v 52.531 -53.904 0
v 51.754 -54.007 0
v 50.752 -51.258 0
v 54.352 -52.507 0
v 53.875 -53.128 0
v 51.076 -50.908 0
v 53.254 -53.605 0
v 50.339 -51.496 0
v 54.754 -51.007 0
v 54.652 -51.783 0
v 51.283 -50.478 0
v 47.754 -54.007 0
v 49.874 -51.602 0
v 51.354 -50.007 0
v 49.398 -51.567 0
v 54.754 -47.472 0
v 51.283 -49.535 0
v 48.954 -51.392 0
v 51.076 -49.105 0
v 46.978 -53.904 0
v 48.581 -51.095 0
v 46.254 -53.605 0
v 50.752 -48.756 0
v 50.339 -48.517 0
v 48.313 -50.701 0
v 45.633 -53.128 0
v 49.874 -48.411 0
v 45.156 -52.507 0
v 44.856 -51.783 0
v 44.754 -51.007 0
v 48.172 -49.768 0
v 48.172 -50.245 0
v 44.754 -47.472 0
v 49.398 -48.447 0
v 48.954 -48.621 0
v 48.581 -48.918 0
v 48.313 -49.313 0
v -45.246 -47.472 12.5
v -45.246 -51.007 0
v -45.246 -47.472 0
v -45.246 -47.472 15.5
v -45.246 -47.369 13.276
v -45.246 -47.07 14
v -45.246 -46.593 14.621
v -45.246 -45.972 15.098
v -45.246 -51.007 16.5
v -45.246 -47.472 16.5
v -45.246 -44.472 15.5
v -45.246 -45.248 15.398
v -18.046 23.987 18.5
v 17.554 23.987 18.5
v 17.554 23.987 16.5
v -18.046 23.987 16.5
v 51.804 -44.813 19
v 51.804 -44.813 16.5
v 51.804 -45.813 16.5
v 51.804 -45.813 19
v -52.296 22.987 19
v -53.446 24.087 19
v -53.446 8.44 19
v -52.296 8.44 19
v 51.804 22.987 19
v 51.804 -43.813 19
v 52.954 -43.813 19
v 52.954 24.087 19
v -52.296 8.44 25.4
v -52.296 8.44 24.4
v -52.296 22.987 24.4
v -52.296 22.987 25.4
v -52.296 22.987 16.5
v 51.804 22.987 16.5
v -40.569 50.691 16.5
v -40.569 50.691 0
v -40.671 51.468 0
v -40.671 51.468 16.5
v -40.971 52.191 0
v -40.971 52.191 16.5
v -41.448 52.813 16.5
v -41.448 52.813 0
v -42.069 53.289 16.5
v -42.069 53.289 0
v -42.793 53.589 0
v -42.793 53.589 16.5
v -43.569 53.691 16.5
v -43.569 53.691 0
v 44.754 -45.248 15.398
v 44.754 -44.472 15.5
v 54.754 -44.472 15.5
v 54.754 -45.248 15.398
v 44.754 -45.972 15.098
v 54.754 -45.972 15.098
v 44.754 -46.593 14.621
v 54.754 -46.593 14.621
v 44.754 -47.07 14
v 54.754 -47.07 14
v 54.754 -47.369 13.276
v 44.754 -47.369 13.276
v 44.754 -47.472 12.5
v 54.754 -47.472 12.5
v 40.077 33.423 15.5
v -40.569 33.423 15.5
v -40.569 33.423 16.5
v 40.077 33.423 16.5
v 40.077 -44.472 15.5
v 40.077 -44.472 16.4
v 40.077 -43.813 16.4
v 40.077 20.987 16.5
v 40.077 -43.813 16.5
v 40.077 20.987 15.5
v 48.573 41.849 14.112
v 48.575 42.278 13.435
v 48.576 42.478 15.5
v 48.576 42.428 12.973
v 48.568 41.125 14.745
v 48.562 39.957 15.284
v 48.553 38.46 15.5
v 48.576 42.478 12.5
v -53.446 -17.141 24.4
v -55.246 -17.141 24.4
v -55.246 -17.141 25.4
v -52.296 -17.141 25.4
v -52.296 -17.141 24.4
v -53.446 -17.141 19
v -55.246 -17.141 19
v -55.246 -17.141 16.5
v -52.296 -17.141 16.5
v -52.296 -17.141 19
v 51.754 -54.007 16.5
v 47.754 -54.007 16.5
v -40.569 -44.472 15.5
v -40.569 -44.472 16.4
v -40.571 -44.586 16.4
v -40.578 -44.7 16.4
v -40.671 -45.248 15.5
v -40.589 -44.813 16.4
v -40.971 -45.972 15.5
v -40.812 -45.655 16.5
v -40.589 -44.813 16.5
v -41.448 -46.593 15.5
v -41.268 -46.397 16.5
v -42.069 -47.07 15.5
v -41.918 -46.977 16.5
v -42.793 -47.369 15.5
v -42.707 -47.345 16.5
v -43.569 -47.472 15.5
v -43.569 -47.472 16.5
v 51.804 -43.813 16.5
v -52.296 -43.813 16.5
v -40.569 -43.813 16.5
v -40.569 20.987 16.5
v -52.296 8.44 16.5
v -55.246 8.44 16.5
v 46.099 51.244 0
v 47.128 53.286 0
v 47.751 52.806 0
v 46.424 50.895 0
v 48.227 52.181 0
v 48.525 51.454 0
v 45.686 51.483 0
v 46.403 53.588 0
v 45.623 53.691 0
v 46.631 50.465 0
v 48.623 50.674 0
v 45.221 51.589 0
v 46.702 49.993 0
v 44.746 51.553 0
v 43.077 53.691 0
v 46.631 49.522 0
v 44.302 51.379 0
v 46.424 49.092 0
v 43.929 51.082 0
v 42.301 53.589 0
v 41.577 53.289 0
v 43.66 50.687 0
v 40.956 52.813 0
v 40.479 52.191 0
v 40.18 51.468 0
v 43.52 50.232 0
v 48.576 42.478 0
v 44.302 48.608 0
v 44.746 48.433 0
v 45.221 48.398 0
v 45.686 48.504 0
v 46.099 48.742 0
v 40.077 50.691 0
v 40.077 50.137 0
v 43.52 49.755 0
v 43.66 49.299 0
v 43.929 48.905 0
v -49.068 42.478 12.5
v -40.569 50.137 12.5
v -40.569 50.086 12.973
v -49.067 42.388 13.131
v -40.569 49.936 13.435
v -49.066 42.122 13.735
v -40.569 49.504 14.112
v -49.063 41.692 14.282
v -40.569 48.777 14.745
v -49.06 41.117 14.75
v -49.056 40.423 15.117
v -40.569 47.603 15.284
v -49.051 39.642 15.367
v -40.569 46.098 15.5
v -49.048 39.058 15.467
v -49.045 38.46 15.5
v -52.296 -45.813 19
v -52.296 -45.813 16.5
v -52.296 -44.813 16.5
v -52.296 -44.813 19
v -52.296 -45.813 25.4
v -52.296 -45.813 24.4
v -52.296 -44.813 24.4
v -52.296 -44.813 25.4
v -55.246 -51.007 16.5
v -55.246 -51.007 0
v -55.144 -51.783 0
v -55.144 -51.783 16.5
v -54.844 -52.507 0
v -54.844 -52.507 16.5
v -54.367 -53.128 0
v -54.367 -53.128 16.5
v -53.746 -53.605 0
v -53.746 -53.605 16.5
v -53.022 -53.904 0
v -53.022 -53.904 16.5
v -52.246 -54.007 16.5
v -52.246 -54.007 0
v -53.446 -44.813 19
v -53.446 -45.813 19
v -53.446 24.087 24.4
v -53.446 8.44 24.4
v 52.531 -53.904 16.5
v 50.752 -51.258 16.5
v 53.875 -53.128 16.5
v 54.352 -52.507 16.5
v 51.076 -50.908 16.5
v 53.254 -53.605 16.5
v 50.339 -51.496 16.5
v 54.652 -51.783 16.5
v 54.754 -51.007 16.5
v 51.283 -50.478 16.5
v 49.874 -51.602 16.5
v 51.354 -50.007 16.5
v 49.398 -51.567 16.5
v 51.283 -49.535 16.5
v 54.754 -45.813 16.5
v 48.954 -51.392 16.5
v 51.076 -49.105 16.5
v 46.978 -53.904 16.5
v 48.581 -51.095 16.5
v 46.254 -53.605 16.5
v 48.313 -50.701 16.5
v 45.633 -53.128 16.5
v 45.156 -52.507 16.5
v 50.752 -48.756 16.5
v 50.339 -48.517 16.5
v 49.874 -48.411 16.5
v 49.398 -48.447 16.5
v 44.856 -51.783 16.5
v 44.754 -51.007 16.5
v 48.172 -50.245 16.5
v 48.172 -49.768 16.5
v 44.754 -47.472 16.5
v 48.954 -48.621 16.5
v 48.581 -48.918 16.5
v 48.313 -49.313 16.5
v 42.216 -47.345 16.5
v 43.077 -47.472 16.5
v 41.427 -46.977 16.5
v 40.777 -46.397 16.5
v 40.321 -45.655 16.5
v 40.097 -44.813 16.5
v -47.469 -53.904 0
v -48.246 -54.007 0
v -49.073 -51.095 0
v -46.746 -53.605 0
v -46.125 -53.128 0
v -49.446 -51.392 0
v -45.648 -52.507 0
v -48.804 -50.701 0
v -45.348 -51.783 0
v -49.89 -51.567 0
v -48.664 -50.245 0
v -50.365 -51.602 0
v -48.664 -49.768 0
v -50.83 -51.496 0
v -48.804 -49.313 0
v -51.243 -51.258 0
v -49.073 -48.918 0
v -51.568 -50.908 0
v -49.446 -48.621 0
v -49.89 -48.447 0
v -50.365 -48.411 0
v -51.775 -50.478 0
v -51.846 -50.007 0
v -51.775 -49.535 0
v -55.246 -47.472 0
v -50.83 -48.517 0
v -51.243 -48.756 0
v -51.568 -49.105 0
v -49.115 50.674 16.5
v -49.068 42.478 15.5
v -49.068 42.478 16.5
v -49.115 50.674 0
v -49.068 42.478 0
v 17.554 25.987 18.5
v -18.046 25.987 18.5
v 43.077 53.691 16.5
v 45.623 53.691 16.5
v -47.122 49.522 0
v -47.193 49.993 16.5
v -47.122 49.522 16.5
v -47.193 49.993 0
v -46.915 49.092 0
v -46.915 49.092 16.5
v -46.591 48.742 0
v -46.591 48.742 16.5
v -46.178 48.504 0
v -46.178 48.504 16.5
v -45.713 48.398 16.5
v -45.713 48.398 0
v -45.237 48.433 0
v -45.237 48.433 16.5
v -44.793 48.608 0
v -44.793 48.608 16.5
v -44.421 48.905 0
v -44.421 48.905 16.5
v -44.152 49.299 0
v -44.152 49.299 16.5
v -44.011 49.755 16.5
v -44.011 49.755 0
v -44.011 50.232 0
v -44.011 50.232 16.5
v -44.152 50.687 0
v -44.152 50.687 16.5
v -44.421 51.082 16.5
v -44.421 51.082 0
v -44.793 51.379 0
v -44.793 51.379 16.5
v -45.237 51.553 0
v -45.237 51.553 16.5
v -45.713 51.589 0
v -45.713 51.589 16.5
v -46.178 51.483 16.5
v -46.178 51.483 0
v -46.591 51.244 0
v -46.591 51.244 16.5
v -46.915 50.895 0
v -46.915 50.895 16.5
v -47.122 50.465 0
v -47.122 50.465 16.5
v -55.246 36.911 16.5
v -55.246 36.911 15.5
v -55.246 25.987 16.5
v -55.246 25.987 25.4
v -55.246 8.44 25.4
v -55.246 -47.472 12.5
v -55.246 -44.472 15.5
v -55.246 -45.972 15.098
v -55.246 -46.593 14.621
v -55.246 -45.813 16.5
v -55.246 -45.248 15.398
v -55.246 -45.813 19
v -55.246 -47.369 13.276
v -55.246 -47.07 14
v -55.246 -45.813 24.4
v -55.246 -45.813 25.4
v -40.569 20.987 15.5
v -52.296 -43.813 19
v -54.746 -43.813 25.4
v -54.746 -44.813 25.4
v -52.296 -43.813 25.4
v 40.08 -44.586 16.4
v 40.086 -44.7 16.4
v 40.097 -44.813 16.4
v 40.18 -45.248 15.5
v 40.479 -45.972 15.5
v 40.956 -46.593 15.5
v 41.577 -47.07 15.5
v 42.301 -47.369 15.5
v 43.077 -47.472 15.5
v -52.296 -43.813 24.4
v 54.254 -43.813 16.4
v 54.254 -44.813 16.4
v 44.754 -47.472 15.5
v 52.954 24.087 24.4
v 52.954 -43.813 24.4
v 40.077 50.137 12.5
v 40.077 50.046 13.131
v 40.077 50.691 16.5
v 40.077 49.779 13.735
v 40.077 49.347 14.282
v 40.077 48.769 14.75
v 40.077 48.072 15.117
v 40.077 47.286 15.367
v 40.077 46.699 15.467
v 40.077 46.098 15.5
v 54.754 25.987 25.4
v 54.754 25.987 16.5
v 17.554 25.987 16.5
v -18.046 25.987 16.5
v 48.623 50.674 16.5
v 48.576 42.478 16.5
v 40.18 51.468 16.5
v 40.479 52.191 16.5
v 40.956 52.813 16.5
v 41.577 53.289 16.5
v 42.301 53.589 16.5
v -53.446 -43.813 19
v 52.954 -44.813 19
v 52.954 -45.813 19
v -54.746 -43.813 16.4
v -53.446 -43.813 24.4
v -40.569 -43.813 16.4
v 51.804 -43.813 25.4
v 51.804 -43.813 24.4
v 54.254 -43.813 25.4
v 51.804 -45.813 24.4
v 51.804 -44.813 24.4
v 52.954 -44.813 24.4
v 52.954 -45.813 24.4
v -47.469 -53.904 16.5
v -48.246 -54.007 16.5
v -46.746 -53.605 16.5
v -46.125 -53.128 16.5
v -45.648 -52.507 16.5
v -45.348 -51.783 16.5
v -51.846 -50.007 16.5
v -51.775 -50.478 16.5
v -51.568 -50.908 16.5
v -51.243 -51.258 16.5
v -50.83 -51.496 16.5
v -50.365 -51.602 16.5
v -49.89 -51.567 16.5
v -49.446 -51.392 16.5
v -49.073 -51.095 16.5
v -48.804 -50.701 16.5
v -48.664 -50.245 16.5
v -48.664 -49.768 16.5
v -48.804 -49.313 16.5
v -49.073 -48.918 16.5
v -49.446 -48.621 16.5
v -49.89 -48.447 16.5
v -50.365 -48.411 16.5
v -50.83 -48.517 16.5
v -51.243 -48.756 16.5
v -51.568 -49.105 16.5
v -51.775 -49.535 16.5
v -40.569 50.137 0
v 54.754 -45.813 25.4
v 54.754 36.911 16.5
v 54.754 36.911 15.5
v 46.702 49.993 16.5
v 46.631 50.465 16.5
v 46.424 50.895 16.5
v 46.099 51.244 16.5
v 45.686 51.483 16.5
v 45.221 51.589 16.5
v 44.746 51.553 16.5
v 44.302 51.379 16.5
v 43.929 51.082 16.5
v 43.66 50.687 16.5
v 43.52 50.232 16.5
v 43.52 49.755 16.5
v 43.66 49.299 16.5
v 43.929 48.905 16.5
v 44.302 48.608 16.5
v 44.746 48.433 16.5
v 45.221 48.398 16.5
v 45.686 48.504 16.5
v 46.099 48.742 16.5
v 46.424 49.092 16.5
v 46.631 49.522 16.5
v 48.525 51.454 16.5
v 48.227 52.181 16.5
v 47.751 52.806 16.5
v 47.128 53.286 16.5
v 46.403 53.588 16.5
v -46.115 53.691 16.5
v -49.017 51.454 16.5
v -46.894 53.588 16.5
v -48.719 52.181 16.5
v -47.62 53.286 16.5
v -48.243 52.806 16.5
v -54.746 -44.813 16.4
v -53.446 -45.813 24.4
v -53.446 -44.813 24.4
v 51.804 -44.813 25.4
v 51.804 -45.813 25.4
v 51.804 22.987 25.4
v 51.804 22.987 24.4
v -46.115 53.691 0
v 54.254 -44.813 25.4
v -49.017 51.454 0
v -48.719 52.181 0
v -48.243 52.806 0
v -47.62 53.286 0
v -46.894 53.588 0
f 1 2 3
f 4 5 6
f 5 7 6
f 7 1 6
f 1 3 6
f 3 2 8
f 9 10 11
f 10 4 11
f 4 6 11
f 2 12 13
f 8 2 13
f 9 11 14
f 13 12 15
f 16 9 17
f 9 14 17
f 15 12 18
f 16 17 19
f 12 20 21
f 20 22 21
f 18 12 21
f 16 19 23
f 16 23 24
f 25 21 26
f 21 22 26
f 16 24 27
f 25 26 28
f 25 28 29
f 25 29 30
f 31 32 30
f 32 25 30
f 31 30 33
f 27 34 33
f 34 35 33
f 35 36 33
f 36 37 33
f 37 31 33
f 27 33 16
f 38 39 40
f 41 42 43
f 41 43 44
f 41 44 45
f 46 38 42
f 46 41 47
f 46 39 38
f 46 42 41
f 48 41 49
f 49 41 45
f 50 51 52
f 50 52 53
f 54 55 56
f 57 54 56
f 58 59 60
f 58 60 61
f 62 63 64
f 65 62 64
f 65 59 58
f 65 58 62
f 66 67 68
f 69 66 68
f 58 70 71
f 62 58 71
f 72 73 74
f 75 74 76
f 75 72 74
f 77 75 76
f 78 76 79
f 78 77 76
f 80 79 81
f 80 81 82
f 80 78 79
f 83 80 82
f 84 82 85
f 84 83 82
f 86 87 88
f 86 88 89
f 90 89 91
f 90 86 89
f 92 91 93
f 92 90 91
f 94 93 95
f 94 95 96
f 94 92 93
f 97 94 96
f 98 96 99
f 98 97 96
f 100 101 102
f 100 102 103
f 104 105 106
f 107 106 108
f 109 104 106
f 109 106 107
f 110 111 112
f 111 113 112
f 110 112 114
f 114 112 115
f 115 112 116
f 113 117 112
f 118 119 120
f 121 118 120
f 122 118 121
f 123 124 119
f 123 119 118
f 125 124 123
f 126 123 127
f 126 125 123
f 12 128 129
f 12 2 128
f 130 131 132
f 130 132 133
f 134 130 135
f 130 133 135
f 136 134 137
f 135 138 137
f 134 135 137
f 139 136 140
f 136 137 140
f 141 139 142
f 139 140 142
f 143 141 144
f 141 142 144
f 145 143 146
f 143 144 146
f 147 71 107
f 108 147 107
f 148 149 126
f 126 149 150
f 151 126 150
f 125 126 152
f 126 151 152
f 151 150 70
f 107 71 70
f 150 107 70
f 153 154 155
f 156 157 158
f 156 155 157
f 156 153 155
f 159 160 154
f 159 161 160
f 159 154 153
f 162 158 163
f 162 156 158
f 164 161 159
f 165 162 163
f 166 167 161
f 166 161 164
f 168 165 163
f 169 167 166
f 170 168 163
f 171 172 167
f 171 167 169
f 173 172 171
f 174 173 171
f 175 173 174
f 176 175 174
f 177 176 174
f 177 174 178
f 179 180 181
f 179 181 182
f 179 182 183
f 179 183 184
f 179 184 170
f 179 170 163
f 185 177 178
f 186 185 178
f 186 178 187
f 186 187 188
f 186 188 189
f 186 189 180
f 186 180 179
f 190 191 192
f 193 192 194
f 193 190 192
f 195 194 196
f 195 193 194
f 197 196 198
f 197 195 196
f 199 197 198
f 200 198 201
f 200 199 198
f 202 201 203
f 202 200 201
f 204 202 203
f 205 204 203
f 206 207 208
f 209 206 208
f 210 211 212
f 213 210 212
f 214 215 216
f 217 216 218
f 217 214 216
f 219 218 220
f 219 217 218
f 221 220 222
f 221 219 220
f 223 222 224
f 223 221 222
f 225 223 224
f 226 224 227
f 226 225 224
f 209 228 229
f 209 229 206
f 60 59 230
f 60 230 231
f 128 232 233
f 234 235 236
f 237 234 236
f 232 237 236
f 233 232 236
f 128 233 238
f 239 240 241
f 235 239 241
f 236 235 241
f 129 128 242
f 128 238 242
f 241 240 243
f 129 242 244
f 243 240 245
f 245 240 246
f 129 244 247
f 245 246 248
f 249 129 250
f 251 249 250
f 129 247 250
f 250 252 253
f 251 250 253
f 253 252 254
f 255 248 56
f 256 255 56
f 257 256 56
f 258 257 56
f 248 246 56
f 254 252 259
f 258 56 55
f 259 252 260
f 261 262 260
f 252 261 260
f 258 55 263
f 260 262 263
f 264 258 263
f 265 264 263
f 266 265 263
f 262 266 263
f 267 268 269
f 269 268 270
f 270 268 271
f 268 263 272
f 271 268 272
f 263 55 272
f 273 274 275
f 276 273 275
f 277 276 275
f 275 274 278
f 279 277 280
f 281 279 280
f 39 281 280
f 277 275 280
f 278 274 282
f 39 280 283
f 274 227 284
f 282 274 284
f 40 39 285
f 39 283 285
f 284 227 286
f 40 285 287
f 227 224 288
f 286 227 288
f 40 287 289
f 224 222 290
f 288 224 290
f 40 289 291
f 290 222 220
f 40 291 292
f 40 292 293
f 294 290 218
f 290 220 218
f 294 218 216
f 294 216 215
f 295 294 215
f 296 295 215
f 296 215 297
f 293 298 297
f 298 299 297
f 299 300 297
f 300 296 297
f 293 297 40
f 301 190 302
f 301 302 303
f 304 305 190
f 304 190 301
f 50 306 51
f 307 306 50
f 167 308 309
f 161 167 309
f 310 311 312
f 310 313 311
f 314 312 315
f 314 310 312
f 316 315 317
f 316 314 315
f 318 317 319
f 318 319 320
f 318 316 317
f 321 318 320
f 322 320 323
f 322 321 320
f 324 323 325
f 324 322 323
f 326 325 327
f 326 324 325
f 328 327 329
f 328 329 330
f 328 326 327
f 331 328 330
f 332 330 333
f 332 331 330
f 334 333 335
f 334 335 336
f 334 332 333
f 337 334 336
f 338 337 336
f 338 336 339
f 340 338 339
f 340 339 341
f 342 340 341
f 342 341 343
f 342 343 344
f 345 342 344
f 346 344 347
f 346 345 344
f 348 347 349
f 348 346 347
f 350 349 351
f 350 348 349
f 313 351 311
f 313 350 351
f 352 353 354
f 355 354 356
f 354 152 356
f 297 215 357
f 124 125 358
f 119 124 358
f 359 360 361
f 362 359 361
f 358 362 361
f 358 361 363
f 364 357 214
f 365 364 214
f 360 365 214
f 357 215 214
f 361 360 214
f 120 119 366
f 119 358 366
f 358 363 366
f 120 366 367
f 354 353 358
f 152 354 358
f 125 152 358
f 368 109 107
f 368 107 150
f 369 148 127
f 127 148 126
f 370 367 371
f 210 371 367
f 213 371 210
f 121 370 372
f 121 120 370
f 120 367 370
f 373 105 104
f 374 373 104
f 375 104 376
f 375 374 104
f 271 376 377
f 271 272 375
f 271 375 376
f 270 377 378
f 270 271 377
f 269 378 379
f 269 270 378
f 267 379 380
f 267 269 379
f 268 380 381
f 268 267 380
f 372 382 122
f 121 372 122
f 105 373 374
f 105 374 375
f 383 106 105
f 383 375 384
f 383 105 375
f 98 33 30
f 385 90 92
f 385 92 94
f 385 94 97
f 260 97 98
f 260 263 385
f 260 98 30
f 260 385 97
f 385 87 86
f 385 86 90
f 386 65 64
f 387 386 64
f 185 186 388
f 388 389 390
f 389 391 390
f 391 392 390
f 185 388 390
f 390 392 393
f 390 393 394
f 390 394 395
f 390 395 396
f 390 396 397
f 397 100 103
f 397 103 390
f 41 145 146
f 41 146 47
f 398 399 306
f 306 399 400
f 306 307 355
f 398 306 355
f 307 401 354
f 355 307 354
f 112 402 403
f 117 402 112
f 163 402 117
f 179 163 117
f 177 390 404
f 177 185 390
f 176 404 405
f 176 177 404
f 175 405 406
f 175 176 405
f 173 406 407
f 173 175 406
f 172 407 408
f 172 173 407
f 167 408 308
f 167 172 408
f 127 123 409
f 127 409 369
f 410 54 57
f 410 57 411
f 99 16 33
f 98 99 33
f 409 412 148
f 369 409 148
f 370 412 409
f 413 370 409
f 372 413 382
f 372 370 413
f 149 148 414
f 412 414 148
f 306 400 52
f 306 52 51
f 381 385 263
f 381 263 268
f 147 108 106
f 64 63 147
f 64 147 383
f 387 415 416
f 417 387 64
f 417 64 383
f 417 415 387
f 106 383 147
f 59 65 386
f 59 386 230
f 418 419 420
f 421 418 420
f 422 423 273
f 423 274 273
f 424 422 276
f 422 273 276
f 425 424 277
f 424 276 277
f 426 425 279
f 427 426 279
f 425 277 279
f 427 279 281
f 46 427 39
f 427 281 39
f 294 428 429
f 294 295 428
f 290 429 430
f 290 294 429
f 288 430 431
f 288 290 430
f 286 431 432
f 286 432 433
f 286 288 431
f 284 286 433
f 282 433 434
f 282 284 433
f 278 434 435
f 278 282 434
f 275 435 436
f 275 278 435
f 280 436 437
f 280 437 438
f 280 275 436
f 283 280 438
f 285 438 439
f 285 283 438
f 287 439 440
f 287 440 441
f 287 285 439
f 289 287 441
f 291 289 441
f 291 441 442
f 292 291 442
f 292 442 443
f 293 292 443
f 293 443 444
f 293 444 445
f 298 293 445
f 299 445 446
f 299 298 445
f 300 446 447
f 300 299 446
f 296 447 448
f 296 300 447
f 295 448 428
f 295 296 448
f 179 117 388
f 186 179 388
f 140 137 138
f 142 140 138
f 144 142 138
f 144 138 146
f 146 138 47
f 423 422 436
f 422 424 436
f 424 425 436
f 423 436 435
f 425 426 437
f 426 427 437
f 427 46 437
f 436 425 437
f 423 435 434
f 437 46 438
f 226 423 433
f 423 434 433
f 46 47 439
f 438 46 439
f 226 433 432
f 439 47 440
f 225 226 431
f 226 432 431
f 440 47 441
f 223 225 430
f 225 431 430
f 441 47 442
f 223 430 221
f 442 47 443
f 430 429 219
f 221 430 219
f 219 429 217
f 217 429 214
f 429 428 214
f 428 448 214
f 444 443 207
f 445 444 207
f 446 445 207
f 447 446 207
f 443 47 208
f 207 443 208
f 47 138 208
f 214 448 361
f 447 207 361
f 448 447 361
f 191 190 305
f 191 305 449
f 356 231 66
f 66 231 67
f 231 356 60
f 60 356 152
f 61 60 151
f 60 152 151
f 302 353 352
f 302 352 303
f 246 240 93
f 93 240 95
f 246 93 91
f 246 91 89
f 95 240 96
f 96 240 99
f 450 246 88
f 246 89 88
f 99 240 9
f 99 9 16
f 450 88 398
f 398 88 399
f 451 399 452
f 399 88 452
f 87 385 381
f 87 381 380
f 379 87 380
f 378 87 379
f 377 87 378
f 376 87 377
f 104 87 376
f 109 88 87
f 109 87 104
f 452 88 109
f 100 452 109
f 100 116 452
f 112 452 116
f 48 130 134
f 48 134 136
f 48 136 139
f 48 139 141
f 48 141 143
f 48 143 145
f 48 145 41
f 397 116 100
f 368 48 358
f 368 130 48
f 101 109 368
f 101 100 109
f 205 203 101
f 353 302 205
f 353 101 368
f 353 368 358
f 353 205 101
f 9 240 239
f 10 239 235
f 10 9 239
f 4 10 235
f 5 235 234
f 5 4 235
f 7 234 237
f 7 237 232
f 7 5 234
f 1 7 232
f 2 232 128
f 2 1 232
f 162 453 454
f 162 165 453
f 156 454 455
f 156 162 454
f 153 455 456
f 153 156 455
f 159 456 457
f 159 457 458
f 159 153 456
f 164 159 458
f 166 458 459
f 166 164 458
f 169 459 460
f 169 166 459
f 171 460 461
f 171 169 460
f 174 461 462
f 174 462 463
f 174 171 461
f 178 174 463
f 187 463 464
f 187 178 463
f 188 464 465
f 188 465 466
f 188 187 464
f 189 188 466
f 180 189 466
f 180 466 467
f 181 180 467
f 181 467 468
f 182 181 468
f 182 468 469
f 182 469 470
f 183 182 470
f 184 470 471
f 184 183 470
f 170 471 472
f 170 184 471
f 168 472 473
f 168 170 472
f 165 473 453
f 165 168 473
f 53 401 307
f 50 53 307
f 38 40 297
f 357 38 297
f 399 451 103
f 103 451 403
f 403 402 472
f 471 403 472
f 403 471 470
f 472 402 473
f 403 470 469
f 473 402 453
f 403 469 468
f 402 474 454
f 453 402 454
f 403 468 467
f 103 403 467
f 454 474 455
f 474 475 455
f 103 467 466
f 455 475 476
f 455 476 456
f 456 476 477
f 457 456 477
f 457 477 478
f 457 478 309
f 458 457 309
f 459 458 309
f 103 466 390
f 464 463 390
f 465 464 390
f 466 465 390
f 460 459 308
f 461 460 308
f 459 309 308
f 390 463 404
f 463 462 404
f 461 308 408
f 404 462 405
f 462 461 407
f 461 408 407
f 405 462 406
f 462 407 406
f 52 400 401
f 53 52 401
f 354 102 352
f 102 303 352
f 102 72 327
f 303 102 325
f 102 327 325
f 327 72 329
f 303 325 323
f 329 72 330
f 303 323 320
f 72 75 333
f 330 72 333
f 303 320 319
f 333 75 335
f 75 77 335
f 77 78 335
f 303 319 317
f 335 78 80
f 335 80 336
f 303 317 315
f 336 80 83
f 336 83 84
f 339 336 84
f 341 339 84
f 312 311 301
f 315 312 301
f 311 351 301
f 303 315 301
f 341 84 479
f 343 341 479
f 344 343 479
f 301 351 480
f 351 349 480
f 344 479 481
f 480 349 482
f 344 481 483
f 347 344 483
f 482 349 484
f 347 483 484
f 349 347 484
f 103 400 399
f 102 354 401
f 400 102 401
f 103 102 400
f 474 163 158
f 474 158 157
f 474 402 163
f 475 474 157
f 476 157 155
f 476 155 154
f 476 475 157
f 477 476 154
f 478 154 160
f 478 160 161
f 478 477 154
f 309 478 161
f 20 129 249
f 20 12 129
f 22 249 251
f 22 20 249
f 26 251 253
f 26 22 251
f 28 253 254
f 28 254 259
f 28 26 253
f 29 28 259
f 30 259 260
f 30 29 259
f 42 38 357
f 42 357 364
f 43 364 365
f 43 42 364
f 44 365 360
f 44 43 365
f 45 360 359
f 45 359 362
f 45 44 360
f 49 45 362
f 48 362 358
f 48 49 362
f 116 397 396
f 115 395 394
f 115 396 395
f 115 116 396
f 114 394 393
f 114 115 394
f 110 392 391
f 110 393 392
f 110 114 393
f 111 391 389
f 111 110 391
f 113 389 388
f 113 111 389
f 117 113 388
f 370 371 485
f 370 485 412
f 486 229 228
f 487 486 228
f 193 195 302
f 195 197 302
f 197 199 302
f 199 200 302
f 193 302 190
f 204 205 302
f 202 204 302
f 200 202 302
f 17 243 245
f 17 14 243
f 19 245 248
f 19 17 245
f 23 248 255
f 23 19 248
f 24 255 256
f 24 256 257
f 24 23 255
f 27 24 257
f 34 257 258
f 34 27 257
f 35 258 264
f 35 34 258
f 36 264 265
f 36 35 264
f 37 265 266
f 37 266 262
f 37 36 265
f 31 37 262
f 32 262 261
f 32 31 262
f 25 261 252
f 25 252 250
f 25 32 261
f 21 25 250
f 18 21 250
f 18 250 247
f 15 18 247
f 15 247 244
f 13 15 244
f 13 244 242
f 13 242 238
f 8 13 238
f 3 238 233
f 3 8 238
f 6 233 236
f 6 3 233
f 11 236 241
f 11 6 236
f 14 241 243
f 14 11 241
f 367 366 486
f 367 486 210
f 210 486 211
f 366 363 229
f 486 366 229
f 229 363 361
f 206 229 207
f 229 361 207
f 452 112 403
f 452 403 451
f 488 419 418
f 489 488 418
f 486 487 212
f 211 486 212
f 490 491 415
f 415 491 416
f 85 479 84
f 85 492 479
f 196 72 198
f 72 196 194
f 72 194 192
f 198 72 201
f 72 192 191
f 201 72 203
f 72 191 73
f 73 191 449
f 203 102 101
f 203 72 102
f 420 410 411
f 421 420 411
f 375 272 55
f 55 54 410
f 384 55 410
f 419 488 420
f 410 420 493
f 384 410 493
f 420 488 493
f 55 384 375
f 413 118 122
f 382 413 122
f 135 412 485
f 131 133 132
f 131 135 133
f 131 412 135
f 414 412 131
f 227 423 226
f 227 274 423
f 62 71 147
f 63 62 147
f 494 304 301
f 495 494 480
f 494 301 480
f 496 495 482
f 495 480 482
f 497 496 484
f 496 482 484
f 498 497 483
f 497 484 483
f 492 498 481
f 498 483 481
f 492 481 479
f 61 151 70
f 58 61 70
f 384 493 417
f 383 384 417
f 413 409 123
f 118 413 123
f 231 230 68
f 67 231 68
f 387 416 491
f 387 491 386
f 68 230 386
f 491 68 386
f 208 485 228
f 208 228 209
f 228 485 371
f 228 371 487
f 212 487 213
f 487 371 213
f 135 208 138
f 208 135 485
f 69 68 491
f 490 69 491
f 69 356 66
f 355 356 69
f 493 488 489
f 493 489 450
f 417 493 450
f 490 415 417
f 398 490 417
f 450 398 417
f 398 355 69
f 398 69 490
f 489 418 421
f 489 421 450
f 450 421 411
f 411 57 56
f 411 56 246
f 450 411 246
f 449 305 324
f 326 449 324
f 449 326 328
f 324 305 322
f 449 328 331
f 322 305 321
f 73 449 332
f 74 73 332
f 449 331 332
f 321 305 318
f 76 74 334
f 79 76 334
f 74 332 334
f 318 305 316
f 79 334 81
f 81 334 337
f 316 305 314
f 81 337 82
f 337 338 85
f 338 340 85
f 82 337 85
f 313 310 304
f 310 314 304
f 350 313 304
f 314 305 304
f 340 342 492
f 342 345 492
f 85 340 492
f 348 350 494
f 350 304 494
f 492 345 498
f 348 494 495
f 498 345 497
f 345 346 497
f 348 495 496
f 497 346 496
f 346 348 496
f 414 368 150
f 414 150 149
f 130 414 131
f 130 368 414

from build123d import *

# Parameters (mm, degrees)
SKETCH1_W             = 6.535180092
SKETCH1_H             = 10
SKETCH1_R             = 1.6
BOSS_EXTRUDE1_DEPTH   = 15.5
BOSS_EXTRUDE1_2_DEPTH = 15.5
BOSS_EXTRUDE1_3_DEPTH = 15.5
BOSS_EXTRUDE1_4_DEPTH = 15.5
SKETCH2_R             = 1.6
BOSS_EXTRUDE2_DEPTH   = 1
SKETCH3_W             = 2.95
SKETCH3_H             = 28.672472045
BOSS_EXTRUDE3_DEPTH   = 2.5
BOSS_EXTRUDE4_DEPTH   = 5.4
SKETCH5_W             = 2.95
SKETCH5_H             = 28.672472045
BOSS_EXTRUDE5_DEPTH   = 1
SKETCH7_W             = 109
SKETCH7_H             = 1
CUT_EXTRUDE1_DEPTH    = 9
FILLET1_R             = 3
FILLET2_R             = 3
SKETCH8_W             = 35.6
SKETCH8_H             = 2
CUT_EXTRUDE2_DEPTH    = 2


with BuildPart() as part:
    # Sketch1 → Boss-Extrude1 (new body)
    with BuildSketch(Plane(origin=(0, 0, 0), x_dir=(0, 1, 0), z_dir=(0, 0, 1))):
        with Locations((-50.739127193, -49.754164457)):
            Rectangle(SKETCH1_W, SKETCH1_H)
        with Locations(Location((-50.006717239, -49.754164457, 0), (0, 0, 270))):
            Circle(SKETCH1_R, mode=Mode.SUBTRACT)
    extrude(amount=BOSS_EXTRUDE1_DEPTH)



with BuildPart() as body_2:
    # Sketch1 → Boss-Extrude1 2 (new body)
    with BuildSketch(Plane(origin=(0, 0, 0), x_dir=(0, 1, 0), z_dir=(0, 0, 1))):
        Polygon((42.477965747, -48.576148962), (50.136732851, -40.077363358), (53.691226628, -40.077363358), (53.691226628, -48.640781304), align=None)
        with Locations(Location((49.993282761, -45.101777457, 0), (0, 0, 270))):
            Circle(SKETCH1_R, mode=Mode.SUBTRACT)
    extrude(amount=BOSS_EXTRUDE1_2_DEPTH)


with BuildPart() as body_3:
    # Sketch1 → Boss-Extrude1 3 (new body)
    with BuildSketch(Plane(origin=(0, 0, 0), x_dir=(0, 1, 0), z_dir=(0, 0, 1))):
        Polygon((53.691226628, 49.132452389), (42.477965747, 49.067820047), (50.136732851, 40.569034443), (53.691226628, 40.569034443), align=None)
        with Locations(Location((49.993282761, 45.593448542, 0), (0, 0, 90))):
            Circle(SKETCH1_R, mode=Mode.SUBTRACT)
    extrude(amount=BOSS_EXTRUDE1_3_DEPTH)


with BuildPart() as body_4:
    # Sketch1 → Boss-Extrude1 4 (new body)
    with BuildSketch(Plane(origin=(0, 0, 0), x_dir=(0, 1, 0), z_dir=(0, 0, 1))):
        with Locations((-50.739127193, 50.245835543)):
            Rectangle(SKETCH1_W, SKETCH1_H)
        with Locations(Location((-50.006717239, 50.245835543, 0), (0, 0, 90))):
            Circle(SKETCH1_R, mode=Mode.SUBTRACT)
    extrude(amount=BOSS_EXTRUDE1_4_DEPTH)


with BuildPart() as part_1:
    add(part.part)

    add(body_2.part)  # Boss-Extrude2 merges body 2

    add(body_3.part)  # Boss-Extrude2 merges body 3

    add(body_4.part)  # Boss-Extrude2 merges body 4
    # Sketch2 → Boss-Extrude2 (add)
    with BuildSketch(Plane.XY.offset(15.5)):
        Polygon((54.754164457, -47.471537147), (54.754164457, -54.006717239), (44.754164457, -54.006717239), (44.754164457, -47.471537147), (40.077363358, -47.471537147), (40.077363358, 20.986771333), (-40.569034443, 20.986771333), (-40.569034443, -47.471537147), (-45.245835543, -47.471537147), (-45.245835543, -54.006717239), (-55.245835543, -54.006717239), (-55.245835543, -47.471537147), (-55.245835543, 36.910584236), (-49.067820047, 42.477965747), (-49.132452389, 53.691226628), (-40.569034443, 53.691226628), (-40.569034443, 33.42328432), (40.077363358, 33.42328432), (40.077363358, 53.691226628), (48.640781304, 53.691226628), (48.576148962, 42.477965747), (54.754164457, 36.910584236), align=None)
        with Locations((49.754164457, -50.006717239)):
            Circle(SKETCH2_R, mode=Mode.SUBTRACT)
        with Locations((45.101777457, 49.993282761)):
            Circle(SKETCH2_R, mode=Mode.SUBTRACT)
        with Locations(Location((-45.593448542, 49.993282761, 0), (0, 0, 180))):
            Circle(SKETCH2_R, mode=Mode.SUBTRACT)
        with Locations(Location((-50.245835543, -50.006717239, 0), (0, 0, 180))):
            Circle(SKETCH2_R, mode=Mode.SUBTRACT)
    extrude(amount=BOSS_EXTRUDE2_DEPTH)

    # Sketch3 → Boss-Extrude3 (add)
    with BuildSketch(Plane.XY.offset(16.5)):
        Polygon((-52.295835543, 8.439904174), (-52.295835543, 22.986771333), (51.804164457, 22.986771333), (51.804164457, -45.813228667), (54.754164457, -45.813228667), (54.754164457, 25.986771333), (-55.245835543, 25.986771333), (-55.245835543, 8.439904174), align=None)
        with Locations((-53.770835543, -31.476992645)):
            Rectangle(SKETCH3_W, SKETCH3_H)
    extrude(amount=BOSS_EXTRUDE3_DEPTH)

    # Sketch4 → Boss-Extrude4 (add)
    with BuildSketch(Plane.XY.offset(19)):
        Polygon((-55.245835543, 25.986771333), (54.754164457, 25.986771333), (54.754164457, -45.813228667), (52.954164457, -45.813228667), (52.954164457, -43.913228667), (52.954164457, 24.086771333), (-53.445835543, 24.086771333), (-53.445835543, 8.439904174), (-55.245835543, 8.439904174), align=None)
        Polygon((-55.245835543, -45.813228667), (-53.445835543, -45.813228667), (-53.445835543, -43.913228667), (-53.445835543, -17.140756622), (-55.245835543, -17.140756622), align=None)
    extrude(amount=BOSS_EXTRUDE4_DEPTH)

    # Sketch5 → Boss-Extrude5 (add)
    with BuildSketch(Plane.XY.offset(24.4)):
        Polygon((-55.245835543, 8.439904174), (-52.295835543, 8.439904174), (-52.295835543, 22.986771333), (51.804164457, 22.986771333), (51.804164457, -45.813228667), (54.754164457, -45.813228667), (54.754164457, 25.986771333), (-55.245835543, 25.986771333), align=None)
        with Locations((-53.770835543, -31.476992645)):
            Rectangle(SKETCH5_W, SKETCH5_H)
    extrude(amount=BOSS_EXTRUDE5_DEPTH)

    # Sketch7 → Cut-Extrude1 (cut)
    with BuildSketch(Plane.XY.offset(25.4)):
        with Locations((-0.245835543, -44.313228667)):
            Rectangle(SKETCH7_W, SKETCH7_H)
    extrude(amount=-CUT_EXTRUDE1_DEPTH, mode=Mode.SUBTRACT)

    # Fillet1
    fillet1_edges = [part_1.edges().sort_by_distance(p)[0] for p in [
        (48.640781304, 53.691226628, 7.75),
        (-49.132452389, 53.691226628, 7.75),
        (-40.569034443, -47.471537147, 16),
        (-55.245835543, -54.006717239, 8.25),
        (-45.245835543, -54.006717239, 8.25),
        (40.077363358, -47.471537147, 16),
        (44.754164457, -54.006717239, 8.25),
        (54.754164457, -54.006717239, 8.25),
        (40.077363358, 53.691226628, 7.75),
        (-40.569034443, 53.691226628, 7.75),
    ]]
    fillet(fillet1_edges, radius=FILLET1_R)

    # Fillet2
    # the kernel refuses this fillet: 3 mm, written as the material it adds along each edge
    with BuildSketch(Plane(origin=(54.147639825, 37.457160078, 15.5), x_dir=(0, 0, -1), z_dir=(-0.7428654483971854, 0.6694407558385198, 0))) as fillet2_piece_1_section:
        with BuildLine():
            CenterArc((FILLET2_R, FILLET2_R), FILLET2_R, 180, 90)
            Line((0, FILLET2_R), (0, 0))
            Line((0, 0), (FILLET2_R, 0))
        make_face()
    fillet2_piece_1 = extrude(amount=26.440545017, mode=Mode.PRIVATE)
    fillet2_piece_1 = split(fillet2_piece_1, bisect_by=Plane(origin=(48.592895704, 45.383408694, 14.829727011), z_dir=(-0.9999833890252455, 0.005763824562264406, 0)), keep=Keep.TOP, mode=Mode.PRIVATE)
    fillet2_piece_1 = split(fillet2_piece_1, bisect_by=Plane(origin=(40.077363358, 45.408013282, 14.829727011), z_dir=(1, 0, 0)), keep=Keep.TOP, mode=Mode.PRIVATE)
    add(fillet2_piece_1)
    with BuildSketch(Plane(origin=(-54.63931091, 37.457160078, 15.5), x_dir=(0, 0, -1), z_dir=(0.7428654483971854, 0.6694407558385198, 0))) as fillet2_piece_2_section:
        with BuildLine():
            CenterArc((FILLET2_R, -FILLET2_R), FILLET2_R, 90, 90)
            Line((0, -FILLET2_R), (0, 0))
            Line((0, 0), (FILLET2_R, 0))
        make_face()
    fillet2_piece_2 = extrude(amount=26.440545017, mode=Mode.PRIVATE)
    fillet2_piece_2 = split(fillet2_piece_2, bisect_by=Plane(origin=(-40.569034443, 45.408013282, 14.829727011), z_dir=(-1, 0, 0)), keep=Keep.TOP, mode=Mode.PRIVATE)
    fillet2_piece_2 = split(fillet2_piece_2, bisect_by=Plane(origin=(-49.084566789, 45.383408694, 14.829727011), z_dir=(0.9999833890252455, 0.005763824562264406, 0)), keep=Keep.TOP, mode=Mode.PRIVATE)
    add(fillet2_piece_2)
    with BuildSketch(Plane(origin=(-45.245835543, -47.471537147, 15.5), x_dir=(0, 0, -1), z_dir=(-1, 0, 0)), Plane(origin=(44.754164457, -47.471537147, 15.5), x_dir=(0, 1, 0), z_dir=(1, 0, 0))) as fillet2_piece_3:
        with BuildLine():
            CenterArc((FILLET2_R, -FILLET2_R), FILLET2_R, 90, 90)
            Line((0, -FILLET2_R), (0, 0))
            Line((0, 0), (FILLET2_R, 0))
        make_face()
    extrude(amount=10)

    # Sketch8 → Cut-Extrude2 (cut)
    with BuildSketch(Plane(origin=(0, 25.986771333, 0), x_dir=(-1, 0, 0), z_dir=(0, 1, 0))):
        with Locations((0.245835543, 17.5)):
            Rectangle(SKETCH8_W, SKETCH8_H)
    extrude(amount=-CUT_EXTRUDE2_DEPTH, mode=Mode.SUBTRACT)


solid = part_1.part
